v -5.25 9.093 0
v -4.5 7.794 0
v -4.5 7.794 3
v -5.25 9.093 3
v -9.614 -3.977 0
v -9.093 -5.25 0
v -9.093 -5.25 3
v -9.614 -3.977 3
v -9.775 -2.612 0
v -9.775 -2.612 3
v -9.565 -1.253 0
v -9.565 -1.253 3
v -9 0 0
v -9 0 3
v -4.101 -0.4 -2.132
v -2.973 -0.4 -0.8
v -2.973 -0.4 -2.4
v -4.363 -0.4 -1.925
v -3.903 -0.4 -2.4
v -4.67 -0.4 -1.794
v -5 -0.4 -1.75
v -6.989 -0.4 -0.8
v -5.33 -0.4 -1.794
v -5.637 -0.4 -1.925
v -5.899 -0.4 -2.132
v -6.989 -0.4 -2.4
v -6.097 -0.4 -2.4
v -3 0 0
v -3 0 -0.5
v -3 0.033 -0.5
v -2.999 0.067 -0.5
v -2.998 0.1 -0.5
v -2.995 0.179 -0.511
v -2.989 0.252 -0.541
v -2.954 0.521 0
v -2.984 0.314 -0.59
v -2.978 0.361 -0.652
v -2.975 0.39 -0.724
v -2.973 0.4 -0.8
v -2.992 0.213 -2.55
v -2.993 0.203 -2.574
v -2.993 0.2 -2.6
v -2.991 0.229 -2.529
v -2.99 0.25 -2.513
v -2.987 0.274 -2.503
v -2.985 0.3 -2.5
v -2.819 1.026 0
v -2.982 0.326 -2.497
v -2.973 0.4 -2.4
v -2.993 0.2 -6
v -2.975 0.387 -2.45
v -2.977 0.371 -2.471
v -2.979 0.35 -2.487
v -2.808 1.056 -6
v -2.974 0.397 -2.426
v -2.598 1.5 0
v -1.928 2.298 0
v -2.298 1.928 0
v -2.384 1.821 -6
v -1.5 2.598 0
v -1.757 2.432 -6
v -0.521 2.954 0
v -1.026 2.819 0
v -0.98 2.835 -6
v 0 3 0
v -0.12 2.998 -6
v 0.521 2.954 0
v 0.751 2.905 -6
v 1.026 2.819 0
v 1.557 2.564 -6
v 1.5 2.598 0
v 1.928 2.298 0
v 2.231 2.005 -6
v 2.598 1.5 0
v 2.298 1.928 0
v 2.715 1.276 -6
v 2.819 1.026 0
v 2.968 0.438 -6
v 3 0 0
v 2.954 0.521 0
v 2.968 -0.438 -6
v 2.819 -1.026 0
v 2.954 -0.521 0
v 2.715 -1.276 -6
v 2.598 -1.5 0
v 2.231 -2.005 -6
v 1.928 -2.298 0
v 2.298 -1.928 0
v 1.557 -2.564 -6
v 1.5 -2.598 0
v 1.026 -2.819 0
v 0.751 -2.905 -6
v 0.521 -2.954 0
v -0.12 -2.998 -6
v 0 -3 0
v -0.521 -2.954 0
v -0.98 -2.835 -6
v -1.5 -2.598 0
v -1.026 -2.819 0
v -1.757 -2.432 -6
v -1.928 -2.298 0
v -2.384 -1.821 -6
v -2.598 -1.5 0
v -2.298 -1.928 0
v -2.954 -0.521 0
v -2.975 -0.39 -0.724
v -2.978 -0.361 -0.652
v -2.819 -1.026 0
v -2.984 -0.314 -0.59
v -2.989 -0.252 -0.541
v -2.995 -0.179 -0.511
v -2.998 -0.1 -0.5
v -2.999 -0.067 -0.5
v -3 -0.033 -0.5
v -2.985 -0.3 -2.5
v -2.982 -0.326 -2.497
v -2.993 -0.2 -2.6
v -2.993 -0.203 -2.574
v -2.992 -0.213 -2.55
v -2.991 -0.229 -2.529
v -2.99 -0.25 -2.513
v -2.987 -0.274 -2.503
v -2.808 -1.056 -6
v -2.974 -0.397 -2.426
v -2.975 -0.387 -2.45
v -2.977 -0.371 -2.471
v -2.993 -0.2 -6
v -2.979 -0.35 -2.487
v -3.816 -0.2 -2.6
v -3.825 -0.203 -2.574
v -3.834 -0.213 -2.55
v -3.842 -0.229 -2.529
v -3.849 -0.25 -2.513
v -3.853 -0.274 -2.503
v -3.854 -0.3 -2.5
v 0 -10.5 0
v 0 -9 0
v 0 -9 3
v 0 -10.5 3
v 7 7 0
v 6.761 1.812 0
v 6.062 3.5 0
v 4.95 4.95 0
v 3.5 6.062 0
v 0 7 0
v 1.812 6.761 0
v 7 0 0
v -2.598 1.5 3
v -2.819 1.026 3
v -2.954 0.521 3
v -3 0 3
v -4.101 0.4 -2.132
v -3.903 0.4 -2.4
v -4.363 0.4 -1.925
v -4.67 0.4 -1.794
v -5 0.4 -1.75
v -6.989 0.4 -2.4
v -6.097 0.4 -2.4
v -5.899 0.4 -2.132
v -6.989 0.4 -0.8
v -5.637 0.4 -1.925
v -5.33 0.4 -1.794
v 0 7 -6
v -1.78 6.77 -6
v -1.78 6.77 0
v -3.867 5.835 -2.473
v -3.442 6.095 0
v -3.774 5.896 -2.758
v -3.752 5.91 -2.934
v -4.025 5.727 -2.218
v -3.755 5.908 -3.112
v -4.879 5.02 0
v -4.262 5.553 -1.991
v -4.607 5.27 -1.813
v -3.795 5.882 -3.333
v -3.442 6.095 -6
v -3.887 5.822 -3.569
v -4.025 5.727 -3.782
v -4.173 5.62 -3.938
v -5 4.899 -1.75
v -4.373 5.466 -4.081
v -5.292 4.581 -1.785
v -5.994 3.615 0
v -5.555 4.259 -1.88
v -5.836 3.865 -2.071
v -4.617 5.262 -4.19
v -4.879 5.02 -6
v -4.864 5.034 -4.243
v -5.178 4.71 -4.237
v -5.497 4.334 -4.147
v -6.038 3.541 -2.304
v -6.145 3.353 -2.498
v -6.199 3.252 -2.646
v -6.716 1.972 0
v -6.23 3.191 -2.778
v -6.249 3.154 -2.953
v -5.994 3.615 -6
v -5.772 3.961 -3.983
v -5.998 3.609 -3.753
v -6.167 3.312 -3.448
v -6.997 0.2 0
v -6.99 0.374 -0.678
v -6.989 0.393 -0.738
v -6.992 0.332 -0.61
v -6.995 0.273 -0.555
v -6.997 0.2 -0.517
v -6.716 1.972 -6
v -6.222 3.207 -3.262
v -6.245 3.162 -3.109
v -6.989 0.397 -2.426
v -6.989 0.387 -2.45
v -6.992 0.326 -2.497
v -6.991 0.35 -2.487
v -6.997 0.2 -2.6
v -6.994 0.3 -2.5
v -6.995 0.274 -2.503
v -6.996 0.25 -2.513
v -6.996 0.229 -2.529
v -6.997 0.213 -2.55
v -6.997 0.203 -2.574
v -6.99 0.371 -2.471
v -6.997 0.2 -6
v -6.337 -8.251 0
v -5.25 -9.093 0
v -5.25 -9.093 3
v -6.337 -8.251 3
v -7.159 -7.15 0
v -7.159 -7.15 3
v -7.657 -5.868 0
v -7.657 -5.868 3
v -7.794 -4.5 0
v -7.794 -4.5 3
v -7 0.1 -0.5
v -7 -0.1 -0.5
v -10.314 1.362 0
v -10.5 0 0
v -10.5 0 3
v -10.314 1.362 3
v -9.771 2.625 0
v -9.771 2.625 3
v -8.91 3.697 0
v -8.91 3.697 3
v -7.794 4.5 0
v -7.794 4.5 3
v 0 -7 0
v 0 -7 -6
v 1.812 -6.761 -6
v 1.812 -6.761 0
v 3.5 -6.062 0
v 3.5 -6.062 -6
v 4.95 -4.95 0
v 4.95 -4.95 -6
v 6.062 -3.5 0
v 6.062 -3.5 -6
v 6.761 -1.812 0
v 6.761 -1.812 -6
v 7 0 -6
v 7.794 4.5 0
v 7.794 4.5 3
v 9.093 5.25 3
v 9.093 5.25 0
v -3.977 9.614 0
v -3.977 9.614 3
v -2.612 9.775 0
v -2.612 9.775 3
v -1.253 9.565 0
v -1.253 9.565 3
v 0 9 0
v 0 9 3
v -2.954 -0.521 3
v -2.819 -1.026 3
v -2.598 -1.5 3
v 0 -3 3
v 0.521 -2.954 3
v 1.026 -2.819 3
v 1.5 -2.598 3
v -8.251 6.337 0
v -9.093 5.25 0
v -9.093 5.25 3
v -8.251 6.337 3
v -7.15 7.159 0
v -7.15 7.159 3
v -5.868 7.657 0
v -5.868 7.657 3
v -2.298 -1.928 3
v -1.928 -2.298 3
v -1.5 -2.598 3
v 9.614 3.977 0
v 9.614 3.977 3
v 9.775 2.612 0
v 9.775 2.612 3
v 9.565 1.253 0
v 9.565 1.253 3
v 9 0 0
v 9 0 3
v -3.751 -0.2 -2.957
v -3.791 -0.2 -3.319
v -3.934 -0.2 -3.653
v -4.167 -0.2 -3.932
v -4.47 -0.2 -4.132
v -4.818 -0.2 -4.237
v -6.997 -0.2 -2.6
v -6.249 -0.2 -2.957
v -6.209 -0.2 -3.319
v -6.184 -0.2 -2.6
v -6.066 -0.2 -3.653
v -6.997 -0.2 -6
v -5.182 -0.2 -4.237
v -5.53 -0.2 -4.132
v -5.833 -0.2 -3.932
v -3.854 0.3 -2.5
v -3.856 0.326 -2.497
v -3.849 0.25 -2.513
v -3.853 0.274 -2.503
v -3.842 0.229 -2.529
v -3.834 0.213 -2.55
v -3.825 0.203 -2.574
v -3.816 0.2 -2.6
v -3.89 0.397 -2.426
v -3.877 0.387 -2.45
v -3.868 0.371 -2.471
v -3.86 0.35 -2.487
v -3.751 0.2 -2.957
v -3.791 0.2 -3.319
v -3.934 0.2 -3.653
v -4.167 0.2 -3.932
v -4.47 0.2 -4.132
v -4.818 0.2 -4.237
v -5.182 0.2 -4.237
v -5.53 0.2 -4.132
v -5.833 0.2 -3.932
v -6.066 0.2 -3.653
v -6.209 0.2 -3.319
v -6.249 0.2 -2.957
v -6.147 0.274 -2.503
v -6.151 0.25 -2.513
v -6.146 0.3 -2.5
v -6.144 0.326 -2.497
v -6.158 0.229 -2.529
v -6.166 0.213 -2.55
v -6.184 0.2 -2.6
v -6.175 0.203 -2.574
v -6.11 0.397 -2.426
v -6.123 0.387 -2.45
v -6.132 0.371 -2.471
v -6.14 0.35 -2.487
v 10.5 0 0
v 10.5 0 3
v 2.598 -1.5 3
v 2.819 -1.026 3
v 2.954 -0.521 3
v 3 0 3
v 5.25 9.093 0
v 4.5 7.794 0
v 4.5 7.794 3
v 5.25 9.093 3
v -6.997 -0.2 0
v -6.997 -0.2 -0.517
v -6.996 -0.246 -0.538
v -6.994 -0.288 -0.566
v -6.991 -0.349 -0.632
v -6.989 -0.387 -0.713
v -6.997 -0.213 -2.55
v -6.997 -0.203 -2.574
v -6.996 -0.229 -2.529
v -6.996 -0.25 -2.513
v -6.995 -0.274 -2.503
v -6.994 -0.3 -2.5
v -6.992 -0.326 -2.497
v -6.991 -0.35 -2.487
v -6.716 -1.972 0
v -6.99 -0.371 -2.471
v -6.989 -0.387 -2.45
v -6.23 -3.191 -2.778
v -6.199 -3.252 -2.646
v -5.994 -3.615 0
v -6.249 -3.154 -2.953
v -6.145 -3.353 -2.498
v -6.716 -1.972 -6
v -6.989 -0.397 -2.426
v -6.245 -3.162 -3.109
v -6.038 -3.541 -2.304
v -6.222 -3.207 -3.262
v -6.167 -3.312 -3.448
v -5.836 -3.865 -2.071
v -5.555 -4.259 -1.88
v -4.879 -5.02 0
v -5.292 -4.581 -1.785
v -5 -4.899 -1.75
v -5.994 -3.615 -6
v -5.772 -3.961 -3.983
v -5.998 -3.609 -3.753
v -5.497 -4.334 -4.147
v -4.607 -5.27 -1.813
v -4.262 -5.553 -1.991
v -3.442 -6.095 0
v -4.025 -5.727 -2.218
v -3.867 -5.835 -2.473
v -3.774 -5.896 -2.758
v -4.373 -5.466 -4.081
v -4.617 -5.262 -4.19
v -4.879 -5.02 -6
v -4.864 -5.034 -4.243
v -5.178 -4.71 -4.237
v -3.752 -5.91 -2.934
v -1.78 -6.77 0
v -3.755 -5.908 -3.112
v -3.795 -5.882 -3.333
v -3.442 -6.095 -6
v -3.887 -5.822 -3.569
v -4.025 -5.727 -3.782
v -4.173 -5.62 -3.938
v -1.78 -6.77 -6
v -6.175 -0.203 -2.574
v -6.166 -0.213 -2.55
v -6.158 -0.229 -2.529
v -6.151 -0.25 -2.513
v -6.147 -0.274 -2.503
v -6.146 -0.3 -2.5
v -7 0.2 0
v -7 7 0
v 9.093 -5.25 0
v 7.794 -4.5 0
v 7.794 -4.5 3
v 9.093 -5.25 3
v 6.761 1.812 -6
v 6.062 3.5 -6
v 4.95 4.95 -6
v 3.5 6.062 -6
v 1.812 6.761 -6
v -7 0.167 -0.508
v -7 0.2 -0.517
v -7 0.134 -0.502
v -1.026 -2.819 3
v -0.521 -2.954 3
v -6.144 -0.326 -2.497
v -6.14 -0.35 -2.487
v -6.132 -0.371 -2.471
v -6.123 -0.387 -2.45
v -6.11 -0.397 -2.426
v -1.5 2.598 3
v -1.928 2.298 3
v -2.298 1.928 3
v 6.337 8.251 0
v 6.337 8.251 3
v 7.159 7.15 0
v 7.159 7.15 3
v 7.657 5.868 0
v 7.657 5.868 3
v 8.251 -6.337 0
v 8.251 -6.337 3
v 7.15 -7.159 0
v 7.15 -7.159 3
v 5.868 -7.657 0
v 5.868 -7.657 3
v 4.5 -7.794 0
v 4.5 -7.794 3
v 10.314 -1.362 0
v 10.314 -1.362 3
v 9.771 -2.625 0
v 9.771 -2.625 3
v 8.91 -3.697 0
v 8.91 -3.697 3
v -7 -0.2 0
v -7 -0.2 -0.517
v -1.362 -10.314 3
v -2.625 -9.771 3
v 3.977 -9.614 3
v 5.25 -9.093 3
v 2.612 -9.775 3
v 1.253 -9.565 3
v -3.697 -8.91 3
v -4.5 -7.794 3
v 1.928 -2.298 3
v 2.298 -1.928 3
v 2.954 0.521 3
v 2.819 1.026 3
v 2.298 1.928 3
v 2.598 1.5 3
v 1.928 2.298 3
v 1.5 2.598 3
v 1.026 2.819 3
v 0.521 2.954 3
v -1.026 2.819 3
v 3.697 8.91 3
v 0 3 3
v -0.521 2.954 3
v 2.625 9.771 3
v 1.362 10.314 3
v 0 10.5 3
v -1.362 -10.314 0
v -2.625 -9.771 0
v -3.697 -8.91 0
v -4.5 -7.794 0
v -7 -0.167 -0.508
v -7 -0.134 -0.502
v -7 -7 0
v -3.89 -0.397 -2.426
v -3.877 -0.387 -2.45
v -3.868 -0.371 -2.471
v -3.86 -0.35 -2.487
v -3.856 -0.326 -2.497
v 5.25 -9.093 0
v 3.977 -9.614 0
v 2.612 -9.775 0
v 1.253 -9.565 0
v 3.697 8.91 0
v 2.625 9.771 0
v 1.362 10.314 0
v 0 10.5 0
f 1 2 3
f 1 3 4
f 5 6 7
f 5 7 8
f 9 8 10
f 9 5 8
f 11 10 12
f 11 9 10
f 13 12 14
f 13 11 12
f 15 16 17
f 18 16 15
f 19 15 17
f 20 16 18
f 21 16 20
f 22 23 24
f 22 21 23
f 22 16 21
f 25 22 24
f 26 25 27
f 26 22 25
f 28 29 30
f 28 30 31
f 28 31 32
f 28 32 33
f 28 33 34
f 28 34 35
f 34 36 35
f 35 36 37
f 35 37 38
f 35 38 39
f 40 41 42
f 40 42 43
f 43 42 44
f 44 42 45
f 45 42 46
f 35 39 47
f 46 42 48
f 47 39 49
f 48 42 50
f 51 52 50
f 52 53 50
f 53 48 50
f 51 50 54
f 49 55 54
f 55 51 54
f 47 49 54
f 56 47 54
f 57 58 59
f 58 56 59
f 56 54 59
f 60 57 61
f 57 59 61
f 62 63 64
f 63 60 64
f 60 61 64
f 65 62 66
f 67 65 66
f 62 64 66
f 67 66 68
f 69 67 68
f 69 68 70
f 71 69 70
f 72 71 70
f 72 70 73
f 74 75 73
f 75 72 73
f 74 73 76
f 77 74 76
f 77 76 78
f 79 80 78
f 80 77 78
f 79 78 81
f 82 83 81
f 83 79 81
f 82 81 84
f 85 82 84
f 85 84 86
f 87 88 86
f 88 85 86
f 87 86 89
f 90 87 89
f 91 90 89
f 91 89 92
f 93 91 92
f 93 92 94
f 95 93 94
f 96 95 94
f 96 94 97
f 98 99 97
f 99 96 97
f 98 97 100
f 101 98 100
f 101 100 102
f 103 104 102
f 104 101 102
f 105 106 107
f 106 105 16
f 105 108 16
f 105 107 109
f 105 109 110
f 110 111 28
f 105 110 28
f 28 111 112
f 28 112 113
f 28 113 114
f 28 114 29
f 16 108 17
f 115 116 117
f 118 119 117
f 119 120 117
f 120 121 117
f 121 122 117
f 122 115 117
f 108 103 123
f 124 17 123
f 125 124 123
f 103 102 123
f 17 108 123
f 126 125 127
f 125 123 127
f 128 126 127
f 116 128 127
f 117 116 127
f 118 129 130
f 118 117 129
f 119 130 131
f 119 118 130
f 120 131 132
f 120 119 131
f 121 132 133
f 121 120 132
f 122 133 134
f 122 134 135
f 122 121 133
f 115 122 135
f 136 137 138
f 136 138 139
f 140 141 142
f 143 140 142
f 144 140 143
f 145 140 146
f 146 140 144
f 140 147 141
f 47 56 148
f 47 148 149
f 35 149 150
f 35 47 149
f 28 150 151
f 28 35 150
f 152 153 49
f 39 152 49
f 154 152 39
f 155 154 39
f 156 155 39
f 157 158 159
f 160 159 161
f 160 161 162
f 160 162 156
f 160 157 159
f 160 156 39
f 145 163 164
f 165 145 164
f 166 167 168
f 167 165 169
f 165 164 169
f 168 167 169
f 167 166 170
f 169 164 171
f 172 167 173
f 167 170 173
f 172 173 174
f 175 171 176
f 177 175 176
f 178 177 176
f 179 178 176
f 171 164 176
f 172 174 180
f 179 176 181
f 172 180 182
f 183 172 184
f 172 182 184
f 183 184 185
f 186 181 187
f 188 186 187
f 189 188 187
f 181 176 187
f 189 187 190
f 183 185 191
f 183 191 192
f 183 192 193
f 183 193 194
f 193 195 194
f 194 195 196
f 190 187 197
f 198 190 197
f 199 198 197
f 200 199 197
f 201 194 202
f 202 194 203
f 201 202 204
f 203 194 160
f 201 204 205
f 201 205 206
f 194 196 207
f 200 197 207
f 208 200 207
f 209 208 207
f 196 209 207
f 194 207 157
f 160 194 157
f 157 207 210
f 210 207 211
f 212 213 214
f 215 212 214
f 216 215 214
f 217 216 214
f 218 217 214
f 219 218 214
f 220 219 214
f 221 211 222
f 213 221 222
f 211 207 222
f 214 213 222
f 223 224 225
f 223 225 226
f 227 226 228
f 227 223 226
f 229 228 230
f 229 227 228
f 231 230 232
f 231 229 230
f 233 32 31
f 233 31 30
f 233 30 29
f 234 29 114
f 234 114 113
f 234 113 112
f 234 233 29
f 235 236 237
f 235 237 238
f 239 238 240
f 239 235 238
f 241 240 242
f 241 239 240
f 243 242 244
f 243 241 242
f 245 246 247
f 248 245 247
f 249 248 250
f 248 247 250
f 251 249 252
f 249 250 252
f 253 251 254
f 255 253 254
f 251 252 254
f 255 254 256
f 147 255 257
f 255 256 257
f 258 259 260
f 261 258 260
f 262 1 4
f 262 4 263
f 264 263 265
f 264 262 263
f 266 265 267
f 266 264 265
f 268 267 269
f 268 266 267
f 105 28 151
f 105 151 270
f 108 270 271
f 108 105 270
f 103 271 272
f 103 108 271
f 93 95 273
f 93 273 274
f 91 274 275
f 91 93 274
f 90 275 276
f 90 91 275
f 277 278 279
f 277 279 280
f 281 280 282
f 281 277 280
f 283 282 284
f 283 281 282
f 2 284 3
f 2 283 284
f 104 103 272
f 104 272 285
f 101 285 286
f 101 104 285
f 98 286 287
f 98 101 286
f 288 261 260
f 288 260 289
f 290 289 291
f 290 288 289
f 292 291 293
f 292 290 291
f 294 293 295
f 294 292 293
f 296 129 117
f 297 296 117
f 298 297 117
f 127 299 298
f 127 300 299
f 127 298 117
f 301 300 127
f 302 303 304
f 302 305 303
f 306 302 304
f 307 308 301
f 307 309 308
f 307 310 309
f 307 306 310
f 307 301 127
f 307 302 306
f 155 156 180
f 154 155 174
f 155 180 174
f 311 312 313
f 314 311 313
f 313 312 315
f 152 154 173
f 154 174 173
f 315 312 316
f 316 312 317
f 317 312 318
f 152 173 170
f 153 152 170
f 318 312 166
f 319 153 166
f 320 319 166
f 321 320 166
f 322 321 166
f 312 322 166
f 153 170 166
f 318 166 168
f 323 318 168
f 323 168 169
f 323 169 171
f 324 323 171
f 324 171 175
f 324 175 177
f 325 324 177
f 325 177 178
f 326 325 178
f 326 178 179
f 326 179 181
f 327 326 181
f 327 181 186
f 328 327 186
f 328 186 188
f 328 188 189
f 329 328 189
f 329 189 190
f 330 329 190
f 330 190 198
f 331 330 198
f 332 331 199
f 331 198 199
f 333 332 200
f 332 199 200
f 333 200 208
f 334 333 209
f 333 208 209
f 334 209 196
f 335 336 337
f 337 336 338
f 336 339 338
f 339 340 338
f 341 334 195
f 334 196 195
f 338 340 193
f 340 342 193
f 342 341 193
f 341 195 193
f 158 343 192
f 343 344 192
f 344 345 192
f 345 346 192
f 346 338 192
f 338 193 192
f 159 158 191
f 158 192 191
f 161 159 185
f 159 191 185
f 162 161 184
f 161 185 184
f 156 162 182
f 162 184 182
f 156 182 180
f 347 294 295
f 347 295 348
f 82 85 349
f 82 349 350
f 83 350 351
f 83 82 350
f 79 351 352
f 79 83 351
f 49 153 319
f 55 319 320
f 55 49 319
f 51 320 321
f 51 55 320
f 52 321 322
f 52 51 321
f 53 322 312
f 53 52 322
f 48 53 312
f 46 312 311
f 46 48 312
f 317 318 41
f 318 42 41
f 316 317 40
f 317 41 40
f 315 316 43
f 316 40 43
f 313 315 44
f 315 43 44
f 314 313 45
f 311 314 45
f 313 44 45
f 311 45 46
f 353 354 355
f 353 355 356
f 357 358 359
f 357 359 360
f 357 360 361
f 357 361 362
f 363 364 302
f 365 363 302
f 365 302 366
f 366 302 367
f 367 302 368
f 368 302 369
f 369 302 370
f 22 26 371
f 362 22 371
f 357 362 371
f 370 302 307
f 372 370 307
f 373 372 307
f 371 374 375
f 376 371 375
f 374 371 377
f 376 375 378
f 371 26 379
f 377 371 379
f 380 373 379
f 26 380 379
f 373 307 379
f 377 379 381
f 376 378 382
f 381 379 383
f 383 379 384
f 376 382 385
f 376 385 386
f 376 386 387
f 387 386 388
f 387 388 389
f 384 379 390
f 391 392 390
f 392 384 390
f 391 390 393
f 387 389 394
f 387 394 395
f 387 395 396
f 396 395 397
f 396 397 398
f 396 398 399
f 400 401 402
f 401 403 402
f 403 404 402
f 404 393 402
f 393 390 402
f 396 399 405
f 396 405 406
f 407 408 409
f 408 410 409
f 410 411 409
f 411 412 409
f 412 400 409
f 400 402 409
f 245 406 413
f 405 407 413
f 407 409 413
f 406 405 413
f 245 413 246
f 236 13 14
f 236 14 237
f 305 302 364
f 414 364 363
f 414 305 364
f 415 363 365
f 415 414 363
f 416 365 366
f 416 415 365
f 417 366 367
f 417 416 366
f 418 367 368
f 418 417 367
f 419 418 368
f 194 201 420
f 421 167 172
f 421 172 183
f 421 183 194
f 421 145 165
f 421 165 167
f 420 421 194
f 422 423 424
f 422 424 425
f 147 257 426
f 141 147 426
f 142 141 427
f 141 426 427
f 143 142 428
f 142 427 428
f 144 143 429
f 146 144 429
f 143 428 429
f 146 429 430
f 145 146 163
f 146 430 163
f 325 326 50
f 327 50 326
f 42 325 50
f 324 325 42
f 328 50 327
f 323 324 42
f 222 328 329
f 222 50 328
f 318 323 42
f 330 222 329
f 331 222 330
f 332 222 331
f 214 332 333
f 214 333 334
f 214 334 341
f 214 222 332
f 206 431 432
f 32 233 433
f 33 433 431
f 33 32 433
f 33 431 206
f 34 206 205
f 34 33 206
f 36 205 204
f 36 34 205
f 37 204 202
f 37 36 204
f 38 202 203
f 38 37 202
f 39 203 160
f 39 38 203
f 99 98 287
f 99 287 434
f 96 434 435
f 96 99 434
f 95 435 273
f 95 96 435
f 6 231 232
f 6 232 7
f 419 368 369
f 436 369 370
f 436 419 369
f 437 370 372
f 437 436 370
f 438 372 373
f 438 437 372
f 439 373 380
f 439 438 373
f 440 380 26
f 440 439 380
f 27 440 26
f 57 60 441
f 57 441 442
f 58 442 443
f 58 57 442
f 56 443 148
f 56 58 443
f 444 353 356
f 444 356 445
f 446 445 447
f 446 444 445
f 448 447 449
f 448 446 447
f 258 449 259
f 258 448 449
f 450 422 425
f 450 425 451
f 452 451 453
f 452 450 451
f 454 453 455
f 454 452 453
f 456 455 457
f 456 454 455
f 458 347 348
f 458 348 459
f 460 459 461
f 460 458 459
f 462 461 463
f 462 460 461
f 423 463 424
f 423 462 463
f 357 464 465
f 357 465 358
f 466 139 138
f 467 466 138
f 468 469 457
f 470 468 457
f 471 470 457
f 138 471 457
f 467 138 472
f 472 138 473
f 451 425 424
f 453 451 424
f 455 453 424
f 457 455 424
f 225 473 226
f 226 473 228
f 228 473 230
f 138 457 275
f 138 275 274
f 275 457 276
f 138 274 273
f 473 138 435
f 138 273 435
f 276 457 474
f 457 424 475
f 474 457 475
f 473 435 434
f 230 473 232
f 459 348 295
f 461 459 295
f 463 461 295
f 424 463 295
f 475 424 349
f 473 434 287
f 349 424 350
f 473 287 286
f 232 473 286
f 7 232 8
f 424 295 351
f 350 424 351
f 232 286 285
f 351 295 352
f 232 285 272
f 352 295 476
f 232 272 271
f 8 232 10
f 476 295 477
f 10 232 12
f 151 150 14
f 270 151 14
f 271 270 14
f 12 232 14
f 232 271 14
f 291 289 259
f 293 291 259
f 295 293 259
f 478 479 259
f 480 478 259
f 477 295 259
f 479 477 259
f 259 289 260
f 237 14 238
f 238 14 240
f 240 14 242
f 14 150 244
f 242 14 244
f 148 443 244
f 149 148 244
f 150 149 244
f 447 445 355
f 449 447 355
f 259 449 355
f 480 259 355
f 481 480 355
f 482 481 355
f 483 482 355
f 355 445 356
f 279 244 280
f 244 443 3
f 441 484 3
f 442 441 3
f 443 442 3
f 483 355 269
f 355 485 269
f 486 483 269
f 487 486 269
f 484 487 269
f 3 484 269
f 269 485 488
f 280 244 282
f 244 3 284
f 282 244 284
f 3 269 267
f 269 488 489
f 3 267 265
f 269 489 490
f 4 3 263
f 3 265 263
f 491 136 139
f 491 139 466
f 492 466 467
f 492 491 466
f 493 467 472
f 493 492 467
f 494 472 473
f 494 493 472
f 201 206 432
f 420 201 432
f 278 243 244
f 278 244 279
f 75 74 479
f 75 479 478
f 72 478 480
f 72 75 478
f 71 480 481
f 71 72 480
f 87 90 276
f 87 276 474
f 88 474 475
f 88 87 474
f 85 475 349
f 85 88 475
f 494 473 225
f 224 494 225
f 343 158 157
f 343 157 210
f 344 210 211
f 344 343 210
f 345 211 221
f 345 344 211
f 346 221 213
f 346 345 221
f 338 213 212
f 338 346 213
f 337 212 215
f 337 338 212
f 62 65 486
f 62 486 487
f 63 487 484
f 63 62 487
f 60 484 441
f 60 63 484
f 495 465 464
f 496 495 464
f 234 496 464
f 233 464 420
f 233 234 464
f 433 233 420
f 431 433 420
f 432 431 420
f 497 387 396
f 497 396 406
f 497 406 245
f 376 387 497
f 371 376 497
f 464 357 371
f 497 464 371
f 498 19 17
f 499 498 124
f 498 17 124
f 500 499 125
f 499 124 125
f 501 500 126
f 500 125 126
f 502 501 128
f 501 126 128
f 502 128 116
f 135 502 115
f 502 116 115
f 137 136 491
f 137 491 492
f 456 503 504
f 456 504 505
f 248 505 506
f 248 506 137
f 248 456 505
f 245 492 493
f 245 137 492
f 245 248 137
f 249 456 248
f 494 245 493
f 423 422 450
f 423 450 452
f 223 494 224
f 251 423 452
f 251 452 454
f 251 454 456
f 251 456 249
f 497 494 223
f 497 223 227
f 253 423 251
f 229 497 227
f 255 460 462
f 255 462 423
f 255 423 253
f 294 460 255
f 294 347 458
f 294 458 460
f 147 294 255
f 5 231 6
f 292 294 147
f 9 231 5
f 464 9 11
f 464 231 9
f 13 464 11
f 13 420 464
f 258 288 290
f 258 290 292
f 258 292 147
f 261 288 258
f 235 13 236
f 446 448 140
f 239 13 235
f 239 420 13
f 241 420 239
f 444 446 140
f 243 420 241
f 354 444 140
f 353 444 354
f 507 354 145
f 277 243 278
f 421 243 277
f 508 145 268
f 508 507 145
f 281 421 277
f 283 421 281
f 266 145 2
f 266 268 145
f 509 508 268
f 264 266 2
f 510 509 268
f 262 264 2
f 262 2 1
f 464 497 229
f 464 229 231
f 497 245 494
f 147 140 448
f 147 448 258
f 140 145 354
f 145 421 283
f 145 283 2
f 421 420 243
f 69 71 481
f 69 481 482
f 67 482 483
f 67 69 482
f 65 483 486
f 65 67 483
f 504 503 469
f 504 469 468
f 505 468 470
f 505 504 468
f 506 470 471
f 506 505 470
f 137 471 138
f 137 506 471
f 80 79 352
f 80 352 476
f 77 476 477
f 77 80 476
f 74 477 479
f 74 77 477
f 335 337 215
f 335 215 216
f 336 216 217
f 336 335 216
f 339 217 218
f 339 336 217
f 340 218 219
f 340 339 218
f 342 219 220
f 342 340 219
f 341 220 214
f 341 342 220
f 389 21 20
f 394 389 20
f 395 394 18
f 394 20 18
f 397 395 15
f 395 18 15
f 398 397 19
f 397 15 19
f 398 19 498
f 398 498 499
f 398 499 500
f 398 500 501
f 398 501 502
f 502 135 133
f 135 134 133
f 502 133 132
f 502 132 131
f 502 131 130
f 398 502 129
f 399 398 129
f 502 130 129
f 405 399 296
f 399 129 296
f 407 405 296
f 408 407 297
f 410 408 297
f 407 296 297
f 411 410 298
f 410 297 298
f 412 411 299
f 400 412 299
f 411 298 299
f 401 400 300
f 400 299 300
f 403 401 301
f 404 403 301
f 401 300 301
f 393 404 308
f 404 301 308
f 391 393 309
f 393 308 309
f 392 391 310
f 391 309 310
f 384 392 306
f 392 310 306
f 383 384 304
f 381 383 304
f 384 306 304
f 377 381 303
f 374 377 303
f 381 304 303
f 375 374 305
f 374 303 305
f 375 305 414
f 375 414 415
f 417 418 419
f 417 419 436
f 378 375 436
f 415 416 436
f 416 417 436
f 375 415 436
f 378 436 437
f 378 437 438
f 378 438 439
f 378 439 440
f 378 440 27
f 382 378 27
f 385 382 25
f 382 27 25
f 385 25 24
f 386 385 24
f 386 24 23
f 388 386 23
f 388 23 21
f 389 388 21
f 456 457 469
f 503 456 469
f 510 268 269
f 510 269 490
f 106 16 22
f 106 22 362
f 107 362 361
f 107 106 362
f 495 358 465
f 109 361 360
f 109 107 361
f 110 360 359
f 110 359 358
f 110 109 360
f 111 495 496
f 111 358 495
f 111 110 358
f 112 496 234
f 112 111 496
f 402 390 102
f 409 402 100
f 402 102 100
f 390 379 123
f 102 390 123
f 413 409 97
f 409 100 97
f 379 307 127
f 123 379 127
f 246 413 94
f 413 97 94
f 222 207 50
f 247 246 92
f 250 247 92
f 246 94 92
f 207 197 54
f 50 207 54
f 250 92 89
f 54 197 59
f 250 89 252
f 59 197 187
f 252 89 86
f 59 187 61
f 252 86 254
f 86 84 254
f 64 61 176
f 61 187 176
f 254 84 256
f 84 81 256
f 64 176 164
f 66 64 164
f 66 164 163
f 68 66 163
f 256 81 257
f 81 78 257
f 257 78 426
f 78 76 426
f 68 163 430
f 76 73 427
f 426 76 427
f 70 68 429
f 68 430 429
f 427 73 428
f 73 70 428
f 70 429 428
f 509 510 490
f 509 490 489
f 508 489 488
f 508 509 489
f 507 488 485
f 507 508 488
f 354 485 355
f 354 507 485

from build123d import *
from build123d.topology import SkipClean

# Parameters (mm, degrees)
BOSS_EXTRUDE1_DEPTH = 3
CIRPATTERN1_COUNT   = 12
BOSS_EXTRUDE2_START = 6
SKETCH3_R           = 3
BOSS_EXTRUDE2_DEPTH = 6
SKETCH4_R           = 1.25
CUT_EXTRUDE1_DEPTH  = 22.272047386
CUT_EXTRUDE3_REACH  = 23.272
FILLET2_R           = 0.1
FILLET3_R           = 0.3
CUT_EXTRUDE4_DEPTH  = 6


with BuildPart() as part:
    # Sketch1 → Boss-Extrude1 (new body)
    with BuildSketch(Plane.XY):
        with BuildLine():
            Line((0, 9), (0, 10.5))
            ThreePointArc((0, 10.5), (2.62541419, 9.771470047), (4.5, 7.794228634))
            Line((4.5, 7.794228634), (1.5, 2.598076211))
            ThreePointArc((1.5, 2.598076211), (0.776457135, 2.897777479), (0, 3))
            Line((0, 3), (0, 9))
        make_face()
    boss_extrude1 = extrude(amount=BOSS_EXTRUDE1_DEPTH)

    # CirPattern1: Boss-Extrude1 ×12 about axis
    cirpattern1_axis = Axis((0, 0, 0), (0, 0, 1))
    for i in range(1, CIRPATTERN1_COUNT):
        add(boss_extrude1.rotate(cirpattern1_axis, i * 360 / CIRPATTERN1_COUNT))

    # Sketch3 → Boss-Extrude2 (add)
    with SkipClean():  # the faces are left unmerged after this step: merging them gives an invalid solid
        with BuildSketch(Plane(origin=(0, 0, 0), x_dir=(-1, 0, 0), z_dir=(0, 0, -1)).offset(BOSS_EXTRUDE2_START)):
            with BuildLine():
                Line((7, 0), (7, -7))
                Line((7, -7), (0, -7))
                ThreePointArc((0, -7), (-4.949747468, -4.949747468), (-7, 0))
                Line((-7, 0), (-7, 7))
                Line((-7, 7), (7, 7))
                Line((7, 7), (7, 0))
            make_face()
            Circle(SKETCH3_R, mode=Mode.SUBTRACT)
        extrude(amount=-BOSS_EXTRUDE2_DEPTH)

    # Sketch4 → Cut-Extrude1 (cut, through all)
    with SkipClean():  # the faces are left unmerged after this step: merging them gives an invalid solid
        with BuildSketch(Plane(origin=(0, 7, 0), x_dir=(1, 0, 0), z_dir=(0, 1, 0))):
            with Locations(Location((-5, 3, 0), (0, 0, 270))):
                Circle(SKETCH4_R)
        extrude(amount=-CUT_EXTRUDE1_DEPTH, mode=Mode.SUBTRACT)

    # Sketch6 → Cut-Extrude3 (cut, up to next)
    with BuildSketch(Plane.ZY.offset(7), mode=Mode.PRIVATE) as cut_extrude3_sk1:
        Polygon((-6, -0.2), (-6, 0.2), (-2.5, 0.2), (-2.5, 0.4), (-0.5, 0.4), (-0.5, -0.4), (-2.5, -0.4), (-2.5, -0.2), align=None)
    cut_extrude3_tool1 = extrude(cut_extrude3_sk1.sketch, amount=-CUT_EXTRUDE3_REACH, mode=Mode.PRIVATE) & part.part
    add(cut_extrude3_tool1.solids().sort_by_distance((-7, 0, -2.783333))[0], mode=Mode.SUBTRACT)

    # Fillet2
    fillet2_edges = [part.edges().sort_by_distance(p)[0] for p in [
        (-6.572821962, 0.4, -2.5),
        (-3.423840993, 0.2, -2.5),
        (-3.413784913, 0.4, -2.5),
        (-6.572821962, 0.2, -2.5),
        (-3.413784913, -0.4, -2.5),
        (-3.423840993, -0.2, -2.5),
        (-6.572821962, -0.4, -2.5),
        (-6.572821962, -0.2, -2.5),
    ]]
    fillet(fillet2_edges, radius=FILLET2_R - 0.0001)  # a hair under: the kernel refuses the full size

    # Fillet3
    fillet3_edges = [part.edges().sort_by_distance(p)[0] for p in [
        (-4.986606875, 0.4, -0.5),
        (-4.986606875, -0.4, -0.5),
    ]]
    fillet(fillet3_edges, radius=FILLET3_R)

    # Sketch7 → Cut-Extrude4 (cut)
    with SkipClean():  # the faces are left unmerged after this step: merging them gives an invalid solid
        with BuildSketch(Plane(origin=(0, 0, -6), x_dir=(-1, 0, 0), z_dir=(0, 0, -1))):
            with BuildLine():
                Line((0, 7), (-7, 7))
                Line((-7, 7), (-7, 0))
                ThreePointArc((-7, 0), (-4.949747468, 4.949747468), (0, 7))
            make_face()
            with BuildLine():
                Line((7, 7), (0, 7))
                ThreePointArc((0, 7), (4.878524367, 5.019960159), (6.997142274, 0.2))
                Line((6.997142274, 0.2), (7, 0.2))
                Line((7, 0.2), (7, 7))
            make_face()
            with BuildLine():
                Line((7, -7), (7, -0.2))
                Line((7, -0.2), (6.997142274, -0.2))
                ThreePointArc((6.997142274, -0.2), (4.878524367, -5.019960159), (0, -7))
                Line((0, -7), (7, -7))
            make_face()
        extrude(amount=-CUT_EXTRUDE4_DEPTH, mode=Mode.SUBTRACT)


solid = part.part
